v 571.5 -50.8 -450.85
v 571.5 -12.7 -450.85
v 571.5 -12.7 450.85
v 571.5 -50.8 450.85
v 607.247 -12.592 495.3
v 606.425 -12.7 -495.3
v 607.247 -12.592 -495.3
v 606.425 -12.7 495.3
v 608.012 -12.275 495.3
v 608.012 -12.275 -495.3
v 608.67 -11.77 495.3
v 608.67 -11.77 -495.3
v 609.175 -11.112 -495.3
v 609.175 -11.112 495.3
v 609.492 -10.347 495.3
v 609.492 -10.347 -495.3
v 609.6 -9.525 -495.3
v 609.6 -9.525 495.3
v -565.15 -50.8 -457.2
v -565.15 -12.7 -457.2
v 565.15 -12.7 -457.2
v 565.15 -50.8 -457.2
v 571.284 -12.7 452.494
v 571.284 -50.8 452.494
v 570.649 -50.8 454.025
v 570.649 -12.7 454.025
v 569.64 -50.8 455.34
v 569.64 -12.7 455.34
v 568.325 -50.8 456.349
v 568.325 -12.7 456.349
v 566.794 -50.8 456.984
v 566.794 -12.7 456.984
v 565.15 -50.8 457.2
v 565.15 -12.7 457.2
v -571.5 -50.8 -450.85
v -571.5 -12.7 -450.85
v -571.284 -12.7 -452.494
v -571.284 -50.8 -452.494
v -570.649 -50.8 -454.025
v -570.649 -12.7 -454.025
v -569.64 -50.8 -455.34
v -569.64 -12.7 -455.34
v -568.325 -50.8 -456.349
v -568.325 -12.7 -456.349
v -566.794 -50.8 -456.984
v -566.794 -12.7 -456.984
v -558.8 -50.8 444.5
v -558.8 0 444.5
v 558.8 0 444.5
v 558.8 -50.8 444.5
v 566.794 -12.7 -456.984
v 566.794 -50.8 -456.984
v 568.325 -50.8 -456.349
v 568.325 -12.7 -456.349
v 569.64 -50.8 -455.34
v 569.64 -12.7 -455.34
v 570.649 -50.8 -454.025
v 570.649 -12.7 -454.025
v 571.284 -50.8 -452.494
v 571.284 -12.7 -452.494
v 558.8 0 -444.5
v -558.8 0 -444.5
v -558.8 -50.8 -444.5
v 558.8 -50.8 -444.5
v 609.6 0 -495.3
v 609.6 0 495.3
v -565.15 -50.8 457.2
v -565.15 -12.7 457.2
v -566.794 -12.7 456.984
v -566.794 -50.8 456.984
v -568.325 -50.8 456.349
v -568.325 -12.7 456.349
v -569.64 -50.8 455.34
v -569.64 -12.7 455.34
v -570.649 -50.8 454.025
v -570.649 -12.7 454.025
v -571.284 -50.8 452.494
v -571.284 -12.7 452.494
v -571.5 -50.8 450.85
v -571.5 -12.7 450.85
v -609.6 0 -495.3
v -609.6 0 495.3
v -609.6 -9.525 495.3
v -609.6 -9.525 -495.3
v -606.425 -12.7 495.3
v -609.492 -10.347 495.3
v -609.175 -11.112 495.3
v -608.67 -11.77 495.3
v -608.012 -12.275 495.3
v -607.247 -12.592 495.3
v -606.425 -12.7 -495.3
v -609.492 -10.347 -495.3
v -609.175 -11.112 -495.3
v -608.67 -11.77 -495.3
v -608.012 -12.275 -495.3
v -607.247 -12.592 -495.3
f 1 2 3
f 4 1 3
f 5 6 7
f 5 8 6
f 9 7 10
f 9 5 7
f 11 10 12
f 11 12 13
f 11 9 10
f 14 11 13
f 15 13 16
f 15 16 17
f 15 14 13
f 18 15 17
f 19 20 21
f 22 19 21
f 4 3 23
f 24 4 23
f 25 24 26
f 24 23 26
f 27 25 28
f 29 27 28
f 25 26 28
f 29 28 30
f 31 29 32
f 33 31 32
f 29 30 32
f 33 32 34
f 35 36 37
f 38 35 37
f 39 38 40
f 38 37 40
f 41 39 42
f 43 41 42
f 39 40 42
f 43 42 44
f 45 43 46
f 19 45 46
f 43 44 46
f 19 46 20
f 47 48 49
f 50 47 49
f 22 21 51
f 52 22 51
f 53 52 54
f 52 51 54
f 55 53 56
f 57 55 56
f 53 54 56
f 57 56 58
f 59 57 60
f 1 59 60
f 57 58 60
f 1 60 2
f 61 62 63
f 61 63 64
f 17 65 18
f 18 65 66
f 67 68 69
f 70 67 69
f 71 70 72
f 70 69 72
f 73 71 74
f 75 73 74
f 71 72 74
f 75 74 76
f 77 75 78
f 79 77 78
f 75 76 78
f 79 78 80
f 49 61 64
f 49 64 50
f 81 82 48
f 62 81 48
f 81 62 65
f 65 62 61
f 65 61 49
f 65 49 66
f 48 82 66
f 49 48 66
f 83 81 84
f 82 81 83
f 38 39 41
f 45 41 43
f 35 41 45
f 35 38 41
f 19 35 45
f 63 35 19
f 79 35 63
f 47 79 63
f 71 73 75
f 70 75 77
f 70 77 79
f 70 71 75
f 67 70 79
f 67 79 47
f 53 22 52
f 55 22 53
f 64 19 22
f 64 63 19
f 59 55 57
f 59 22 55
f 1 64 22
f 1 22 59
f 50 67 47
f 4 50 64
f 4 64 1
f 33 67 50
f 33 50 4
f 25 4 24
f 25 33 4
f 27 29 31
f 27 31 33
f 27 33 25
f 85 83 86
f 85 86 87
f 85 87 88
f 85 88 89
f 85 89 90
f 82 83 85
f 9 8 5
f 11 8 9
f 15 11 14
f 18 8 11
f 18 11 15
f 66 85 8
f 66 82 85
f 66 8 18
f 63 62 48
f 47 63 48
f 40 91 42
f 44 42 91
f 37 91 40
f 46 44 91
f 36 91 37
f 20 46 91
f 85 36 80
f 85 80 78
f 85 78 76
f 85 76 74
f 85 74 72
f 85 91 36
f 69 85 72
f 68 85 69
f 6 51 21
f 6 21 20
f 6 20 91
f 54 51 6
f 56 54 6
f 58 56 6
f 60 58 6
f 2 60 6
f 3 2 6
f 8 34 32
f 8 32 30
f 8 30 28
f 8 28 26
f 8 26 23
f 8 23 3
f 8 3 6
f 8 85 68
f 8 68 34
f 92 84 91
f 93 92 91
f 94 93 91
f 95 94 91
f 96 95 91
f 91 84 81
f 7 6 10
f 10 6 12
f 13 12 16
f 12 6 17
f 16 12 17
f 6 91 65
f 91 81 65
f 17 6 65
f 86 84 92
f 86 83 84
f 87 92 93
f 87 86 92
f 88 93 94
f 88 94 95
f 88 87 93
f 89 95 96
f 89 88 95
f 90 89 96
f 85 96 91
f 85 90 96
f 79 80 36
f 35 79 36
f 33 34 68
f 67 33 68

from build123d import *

# Parameters (mm, degrees)
F0_W     = 1117.6
F0_H     = 889
F1_DEPTH = 50.8
F0_W_2   = 1219.2
F0_H_2   = 990.6
F2_DEPTH = 12.7
F3_R     = 3.175


with BuildPart() as f1:
    # F0 (on Front) → F1 (new body)
    with BuildSketch(Plane.XZ):
        with BuildLine():
            Line((-565.15, -457.2), (565.15, -457.2))
            ThreePointArc((565.15, -457.2), (569.640128, -455.340128), (571.5, -450.85))
            Line((571.5, -450.85), (571.5, 450.85))
            ThreePointArc((571.5, 450.85), (569.640128, 455.340128), (565.15, 457.2))
            Line((565.15, 457.2), (-565.15, 457.2))
            ThreePointArc((-565.15, 457.2), (-569.640128, 455.340128), (-571.5, 450.85))
            Line((-571.5, 450.85), (-571.5, -450.85))
            ThreePointArc((-571.5, -450.85), (-569.640128, -455.340128), (-565.15, -457.2))
        make_face()
        Rectangle(F0_W, F0_H, mode=Mode.SUBTRACT)
    extrude(amount=F1_DEPTH)

    # F0 (on Front) → F2 (join)
    with BuildSketch(Plane.XZ):
        Rectangle(F0_W_2, F0_H_2)
        with BuildLine():
            ThreePointArc((571.5, -450.85), (569.640128, -455.340128), (565.15, -457.2))
            Line((565.15, -457.2), (-565.15, -457.2))
            ThreePointArc((-565.15, -457.2), (-569.640128, -455.340128), (-571.5, -450.85))
            Line((-571.5, -450.85), (-571.5, 450.85))
            ThreePointArc((-571.5, 450.85), (-569.640128, 455.340128), (-565.15, 457.2))
            Line((-565.15, 457.2), (565.15, 457.2))
            ThreePointArc((565.15, 457.2), (569.640128, 455.340128), (571.5, 450.85))
            Line((571.5, 450.85), (571.5, -450.85))
        make_face(mode=Mode.SUBTRACT)
    extrude(amount=F2_DEPTH)

    # F3
    f3_edges = [f1.edges().sort_by_distance(p)[0] for p in [
        (-609.6, -12.7, 0),
        (609.6, -12.7, 0),
    ]]
    fillet(f3_edges, radius=F3_R)


solid = f1.part
